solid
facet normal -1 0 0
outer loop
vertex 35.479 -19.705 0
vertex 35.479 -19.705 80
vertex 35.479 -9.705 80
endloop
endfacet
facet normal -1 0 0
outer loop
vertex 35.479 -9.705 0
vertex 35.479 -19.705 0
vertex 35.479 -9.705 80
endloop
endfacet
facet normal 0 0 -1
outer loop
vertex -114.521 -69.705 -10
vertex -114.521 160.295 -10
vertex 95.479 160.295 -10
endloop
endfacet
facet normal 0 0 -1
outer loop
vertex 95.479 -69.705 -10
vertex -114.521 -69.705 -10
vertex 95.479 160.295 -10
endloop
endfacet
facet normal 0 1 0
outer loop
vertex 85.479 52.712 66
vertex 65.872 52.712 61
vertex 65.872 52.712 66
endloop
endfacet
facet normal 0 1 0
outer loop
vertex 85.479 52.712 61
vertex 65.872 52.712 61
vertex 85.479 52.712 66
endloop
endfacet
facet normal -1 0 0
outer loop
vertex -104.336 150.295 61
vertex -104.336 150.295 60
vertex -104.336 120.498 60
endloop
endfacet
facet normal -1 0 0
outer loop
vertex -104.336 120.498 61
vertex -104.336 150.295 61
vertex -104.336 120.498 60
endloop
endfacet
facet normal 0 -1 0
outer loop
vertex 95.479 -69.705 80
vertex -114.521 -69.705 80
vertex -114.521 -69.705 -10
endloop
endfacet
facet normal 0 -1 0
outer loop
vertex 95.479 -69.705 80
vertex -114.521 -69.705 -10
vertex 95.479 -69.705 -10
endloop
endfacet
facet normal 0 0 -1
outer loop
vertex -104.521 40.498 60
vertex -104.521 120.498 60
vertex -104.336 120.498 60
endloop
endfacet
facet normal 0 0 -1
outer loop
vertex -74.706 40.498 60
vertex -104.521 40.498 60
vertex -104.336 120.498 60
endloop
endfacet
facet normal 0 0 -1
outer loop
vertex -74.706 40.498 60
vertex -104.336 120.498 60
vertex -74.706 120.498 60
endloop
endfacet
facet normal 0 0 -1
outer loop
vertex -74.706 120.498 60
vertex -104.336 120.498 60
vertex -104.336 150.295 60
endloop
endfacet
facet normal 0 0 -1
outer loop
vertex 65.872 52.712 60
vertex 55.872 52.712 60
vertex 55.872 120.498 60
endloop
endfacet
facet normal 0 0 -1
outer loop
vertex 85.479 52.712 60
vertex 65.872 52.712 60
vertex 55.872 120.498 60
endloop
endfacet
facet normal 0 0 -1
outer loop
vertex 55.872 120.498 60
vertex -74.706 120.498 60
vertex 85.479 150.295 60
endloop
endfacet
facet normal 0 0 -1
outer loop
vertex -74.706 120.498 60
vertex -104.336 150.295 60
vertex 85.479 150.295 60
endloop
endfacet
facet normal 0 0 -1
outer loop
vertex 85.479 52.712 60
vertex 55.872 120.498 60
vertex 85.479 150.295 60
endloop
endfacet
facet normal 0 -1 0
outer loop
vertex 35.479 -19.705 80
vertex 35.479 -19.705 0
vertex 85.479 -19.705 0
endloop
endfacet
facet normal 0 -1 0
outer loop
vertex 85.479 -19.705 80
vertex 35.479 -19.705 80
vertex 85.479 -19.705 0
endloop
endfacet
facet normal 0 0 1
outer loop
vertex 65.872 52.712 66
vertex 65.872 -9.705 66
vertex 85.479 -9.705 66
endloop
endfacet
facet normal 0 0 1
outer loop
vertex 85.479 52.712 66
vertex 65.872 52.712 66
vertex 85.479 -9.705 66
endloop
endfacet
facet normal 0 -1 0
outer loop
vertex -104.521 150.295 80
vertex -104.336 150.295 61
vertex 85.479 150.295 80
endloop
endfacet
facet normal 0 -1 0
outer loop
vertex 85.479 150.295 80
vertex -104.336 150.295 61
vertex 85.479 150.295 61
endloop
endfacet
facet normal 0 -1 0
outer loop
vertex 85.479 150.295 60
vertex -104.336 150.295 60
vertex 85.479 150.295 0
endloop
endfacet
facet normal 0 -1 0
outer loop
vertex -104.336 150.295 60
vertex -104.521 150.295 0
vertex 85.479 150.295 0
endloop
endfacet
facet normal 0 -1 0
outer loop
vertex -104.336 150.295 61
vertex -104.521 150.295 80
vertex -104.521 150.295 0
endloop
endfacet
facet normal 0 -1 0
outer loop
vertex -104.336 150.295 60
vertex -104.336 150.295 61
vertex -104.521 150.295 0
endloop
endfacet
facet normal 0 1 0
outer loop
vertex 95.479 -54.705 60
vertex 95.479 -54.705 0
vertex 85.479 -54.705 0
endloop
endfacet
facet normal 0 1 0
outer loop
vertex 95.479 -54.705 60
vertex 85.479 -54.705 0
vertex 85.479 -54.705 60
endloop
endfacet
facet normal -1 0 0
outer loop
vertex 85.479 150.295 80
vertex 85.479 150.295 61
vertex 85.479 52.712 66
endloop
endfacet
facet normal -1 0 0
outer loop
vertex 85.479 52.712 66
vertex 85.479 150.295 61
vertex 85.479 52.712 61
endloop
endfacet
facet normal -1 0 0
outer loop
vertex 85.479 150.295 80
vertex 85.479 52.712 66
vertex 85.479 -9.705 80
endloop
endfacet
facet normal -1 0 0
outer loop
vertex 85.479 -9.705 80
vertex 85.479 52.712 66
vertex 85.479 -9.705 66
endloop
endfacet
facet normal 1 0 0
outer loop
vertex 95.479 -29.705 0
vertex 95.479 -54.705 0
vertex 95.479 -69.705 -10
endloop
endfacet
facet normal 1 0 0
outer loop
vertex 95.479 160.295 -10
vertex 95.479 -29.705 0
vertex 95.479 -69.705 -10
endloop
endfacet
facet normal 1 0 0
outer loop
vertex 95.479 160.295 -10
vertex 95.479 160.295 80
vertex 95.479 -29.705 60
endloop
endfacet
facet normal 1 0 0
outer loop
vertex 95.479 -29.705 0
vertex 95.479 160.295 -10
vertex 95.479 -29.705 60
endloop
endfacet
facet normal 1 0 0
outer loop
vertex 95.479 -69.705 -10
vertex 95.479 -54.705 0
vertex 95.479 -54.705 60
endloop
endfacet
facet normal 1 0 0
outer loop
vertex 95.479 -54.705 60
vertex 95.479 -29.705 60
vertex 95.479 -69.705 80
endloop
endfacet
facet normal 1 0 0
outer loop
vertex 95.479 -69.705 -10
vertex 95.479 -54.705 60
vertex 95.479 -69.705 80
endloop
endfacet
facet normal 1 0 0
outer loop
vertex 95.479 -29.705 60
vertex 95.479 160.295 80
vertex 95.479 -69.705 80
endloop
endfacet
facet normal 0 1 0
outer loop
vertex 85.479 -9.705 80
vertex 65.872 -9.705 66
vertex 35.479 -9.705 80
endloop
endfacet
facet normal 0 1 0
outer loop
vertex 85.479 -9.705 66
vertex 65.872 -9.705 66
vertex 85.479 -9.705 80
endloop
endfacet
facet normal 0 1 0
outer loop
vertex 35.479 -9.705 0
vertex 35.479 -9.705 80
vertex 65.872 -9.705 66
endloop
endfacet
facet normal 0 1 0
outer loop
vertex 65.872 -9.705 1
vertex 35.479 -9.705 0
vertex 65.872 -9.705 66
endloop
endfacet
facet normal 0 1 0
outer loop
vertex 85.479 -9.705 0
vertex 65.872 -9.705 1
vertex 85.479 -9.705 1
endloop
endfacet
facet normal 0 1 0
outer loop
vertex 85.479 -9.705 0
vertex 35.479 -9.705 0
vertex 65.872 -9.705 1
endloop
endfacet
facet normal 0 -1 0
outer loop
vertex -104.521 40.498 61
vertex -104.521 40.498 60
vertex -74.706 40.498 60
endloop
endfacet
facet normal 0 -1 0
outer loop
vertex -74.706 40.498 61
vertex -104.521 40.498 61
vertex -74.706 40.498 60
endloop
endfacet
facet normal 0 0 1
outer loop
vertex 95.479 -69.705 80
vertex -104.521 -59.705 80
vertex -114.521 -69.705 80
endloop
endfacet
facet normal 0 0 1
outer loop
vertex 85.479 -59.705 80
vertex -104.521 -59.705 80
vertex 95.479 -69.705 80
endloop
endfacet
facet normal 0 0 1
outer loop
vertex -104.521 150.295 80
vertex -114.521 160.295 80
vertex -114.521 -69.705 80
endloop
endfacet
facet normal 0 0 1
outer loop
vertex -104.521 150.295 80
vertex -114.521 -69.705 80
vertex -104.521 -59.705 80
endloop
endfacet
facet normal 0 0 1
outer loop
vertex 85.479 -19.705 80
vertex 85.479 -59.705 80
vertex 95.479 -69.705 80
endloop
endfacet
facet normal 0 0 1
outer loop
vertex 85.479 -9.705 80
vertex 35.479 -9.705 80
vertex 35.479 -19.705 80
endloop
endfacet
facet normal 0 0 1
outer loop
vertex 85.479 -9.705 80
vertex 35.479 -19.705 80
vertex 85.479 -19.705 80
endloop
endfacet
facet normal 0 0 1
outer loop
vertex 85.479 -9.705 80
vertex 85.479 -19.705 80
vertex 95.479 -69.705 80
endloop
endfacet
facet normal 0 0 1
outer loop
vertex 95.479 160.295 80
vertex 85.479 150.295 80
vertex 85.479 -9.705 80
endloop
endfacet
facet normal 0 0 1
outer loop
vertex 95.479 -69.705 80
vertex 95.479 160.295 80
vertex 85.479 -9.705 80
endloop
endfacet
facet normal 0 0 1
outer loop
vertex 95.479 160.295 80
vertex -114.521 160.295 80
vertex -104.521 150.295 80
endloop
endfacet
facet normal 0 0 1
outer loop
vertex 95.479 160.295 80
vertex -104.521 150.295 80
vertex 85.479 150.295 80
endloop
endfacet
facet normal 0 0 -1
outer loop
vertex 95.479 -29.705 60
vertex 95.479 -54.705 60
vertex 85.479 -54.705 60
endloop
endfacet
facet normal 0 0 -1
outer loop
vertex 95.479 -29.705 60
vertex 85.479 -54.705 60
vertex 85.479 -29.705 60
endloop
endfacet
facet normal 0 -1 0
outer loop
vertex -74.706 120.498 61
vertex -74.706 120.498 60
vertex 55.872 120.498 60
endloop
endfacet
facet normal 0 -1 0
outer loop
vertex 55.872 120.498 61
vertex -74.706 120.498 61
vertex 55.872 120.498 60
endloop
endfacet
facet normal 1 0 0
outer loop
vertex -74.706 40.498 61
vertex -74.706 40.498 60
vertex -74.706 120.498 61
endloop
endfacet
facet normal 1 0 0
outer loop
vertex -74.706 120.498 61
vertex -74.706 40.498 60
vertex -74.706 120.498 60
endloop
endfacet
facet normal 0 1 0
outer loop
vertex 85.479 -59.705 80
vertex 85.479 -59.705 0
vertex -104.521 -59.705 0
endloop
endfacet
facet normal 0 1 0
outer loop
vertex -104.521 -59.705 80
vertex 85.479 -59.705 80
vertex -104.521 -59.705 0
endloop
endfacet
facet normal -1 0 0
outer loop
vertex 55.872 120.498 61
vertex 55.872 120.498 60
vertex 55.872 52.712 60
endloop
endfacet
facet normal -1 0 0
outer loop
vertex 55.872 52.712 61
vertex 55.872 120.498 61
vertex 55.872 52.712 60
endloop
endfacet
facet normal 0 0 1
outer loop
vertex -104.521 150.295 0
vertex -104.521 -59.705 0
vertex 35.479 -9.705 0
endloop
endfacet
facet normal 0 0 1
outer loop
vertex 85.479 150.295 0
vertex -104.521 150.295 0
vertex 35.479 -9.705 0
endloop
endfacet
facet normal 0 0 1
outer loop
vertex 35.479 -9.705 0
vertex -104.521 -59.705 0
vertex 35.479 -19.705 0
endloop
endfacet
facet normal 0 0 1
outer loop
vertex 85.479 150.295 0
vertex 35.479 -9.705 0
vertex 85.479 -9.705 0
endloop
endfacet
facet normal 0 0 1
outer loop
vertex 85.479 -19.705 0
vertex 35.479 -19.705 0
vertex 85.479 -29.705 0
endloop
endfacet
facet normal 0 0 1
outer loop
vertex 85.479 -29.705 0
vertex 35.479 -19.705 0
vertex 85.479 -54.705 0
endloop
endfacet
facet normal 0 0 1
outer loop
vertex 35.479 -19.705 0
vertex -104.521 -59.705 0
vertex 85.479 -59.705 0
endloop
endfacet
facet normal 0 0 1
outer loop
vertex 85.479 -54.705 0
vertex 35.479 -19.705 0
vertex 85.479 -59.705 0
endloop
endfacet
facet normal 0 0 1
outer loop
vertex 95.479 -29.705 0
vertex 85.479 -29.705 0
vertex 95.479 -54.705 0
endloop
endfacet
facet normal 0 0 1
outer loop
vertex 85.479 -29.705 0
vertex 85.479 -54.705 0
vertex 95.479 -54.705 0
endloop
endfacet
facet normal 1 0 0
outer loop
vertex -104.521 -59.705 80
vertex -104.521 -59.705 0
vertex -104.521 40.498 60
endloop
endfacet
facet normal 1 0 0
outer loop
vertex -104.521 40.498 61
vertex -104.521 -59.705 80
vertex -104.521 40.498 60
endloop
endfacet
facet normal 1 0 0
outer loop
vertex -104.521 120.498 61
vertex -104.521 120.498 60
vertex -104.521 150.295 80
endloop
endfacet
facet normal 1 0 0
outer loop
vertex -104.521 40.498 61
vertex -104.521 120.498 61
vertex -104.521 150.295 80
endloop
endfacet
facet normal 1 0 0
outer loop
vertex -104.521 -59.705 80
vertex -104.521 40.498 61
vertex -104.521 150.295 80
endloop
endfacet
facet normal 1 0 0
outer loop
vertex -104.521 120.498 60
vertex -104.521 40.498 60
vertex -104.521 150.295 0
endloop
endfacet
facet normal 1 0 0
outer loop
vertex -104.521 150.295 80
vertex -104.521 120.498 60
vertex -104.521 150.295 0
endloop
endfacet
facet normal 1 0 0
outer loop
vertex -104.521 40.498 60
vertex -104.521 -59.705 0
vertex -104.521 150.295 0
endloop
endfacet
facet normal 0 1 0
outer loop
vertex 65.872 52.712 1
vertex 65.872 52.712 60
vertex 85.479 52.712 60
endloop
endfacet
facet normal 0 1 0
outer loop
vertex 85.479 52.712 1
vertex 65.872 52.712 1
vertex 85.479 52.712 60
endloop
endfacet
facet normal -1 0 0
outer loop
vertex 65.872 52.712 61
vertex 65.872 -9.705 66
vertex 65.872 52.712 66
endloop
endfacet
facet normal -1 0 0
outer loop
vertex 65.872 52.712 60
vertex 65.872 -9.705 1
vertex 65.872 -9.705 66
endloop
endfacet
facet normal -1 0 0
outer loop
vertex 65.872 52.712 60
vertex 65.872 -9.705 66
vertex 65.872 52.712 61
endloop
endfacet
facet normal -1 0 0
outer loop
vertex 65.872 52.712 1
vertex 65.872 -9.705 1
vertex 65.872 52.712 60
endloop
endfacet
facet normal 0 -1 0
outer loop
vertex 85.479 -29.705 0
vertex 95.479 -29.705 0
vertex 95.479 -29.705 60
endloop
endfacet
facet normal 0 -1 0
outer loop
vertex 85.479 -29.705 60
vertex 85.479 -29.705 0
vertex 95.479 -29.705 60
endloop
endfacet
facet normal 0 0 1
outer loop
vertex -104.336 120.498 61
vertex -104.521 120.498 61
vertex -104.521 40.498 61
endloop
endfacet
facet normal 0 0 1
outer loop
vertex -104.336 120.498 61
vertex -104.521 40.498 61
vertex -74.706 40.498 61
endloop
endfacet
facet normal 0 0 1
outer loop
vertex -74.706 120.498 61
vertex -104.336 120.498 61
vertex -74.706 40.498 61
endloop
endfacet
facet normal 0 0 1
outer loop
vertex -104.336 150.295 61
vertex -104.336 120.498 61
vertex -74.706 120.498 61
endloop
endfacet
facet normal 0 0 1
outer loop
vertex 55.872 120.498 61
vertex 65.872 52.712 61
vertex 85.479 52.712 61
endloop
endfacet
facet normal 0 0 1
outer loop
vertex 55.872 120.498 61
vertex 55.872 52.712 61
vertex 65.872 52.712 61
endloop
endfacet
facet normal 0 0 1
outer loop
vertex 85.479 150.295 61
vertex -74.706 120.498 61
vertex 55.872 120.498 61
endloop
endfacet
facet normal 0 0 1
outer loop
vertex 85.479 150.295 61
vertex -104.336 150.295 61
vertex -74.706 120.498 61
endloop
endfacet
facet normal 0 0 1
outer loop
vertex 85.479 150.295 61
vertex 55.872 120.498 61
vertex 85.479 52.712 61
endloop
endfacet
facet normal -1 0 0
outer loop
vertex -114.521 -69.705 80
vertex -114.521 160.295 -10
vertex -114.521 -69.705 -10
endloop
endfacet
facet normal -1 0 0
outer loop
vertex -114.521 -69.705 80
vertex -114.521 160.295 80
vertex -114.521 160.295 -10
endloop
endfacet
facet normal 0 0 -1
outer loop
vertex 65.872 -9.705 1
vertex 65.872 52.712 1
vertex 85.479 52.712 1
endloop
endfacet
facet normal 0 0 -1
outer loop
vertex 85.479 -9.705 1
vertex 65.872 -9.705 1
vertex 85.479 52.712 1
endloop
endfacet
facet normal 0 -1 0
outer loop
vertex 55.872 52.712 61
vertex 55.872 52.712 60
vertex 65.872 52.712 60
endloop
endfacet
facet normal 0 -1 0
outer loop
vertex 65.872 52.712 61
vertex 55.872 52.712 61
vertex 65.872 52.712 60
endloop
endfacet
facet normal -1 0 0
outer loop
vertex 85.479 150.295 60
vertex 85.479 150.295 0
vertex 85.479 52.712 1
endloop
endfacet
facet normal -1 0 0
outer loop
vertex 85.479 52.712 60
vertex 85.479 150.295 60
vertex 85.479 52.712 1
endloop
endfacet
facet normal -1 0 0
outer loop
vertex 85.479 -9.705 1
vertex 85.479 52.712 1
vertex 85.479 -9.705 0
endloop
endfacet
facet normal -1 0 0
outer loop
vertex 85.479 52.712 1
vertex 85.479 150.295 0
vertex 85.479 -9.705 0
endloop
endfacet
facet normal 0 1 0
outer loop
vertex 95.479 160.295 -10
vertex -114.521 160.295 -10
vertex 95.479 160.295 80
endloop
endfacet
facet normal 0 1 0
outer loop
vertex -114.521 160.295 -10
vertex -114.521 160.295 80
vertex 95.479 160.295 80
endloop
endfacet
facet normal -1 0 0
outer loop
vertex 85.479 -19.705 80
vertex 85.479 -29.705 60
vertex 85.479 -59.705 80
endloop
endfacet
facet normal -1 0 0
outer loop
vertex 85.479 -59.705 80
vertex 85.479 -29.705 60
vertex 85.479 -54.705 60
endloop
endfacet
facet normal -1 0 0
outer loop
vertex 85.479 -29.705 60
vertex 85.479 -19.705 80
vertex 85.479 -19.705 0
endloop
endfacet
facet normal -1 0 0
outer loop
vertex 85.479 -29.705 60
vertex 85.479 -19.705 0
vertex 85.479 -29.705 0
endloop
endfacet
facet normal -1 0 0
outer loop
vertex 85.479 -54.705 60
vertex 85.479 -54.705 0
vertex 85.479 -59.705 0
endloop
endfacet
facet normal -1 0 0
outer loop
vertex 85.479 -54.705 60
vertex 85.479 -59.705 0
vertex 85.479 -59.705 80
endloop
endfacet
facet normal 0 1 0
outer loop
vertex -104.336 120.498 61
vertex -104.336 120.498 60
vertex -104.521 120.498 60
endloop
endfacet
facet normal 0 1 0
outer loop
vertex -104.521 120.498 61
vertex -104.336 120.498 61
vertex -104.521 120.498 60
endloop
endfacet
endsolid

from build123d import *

# Parameters (mm, degrees)
F0_W      = 210
F0_H      = 230
F0_W_2    = 50
F0_H_2    = 10
F1_DEPTH  = 80
F2_W      = 210
F2_H      = 230
F3_DEPTH  = 10
F5_W      = 20
F5_H      = 63
F6_DEPTH  = 1
F7_W      = 19.6074382961
F7_H      = 62.4177437024
F8_DEPTH  = 60
F9_W      = 25
F9_H      = 60
F10_DEPTH = 10
F11_W     = 19.6074382961
F11_H     = 52.7124775872
F12_DEPTH = 5
F13_DEPTH = 5


with BuildPart() as f1:
    # F0 (on Top) → F1 (new body)
    with BuildSketch(Plane.XY):
        with Locations((-9.5208105445, 45.2947338848)):
            Rectangle(F0_W, F0_H)
        Polygon((-104.5208105445, -59.7052661152), (-104.5208105445, 150.2947338848), (85.4791894555, 150.2947338848), (85.4791894555, -9.7052661152), (85.4791894555, -19.7052661152), (85.4791894555, -59.7052661152), (35.4791894555, -59.7052661152), align=None, mode=Mode.SUBTRACT)
        with Locations((60.4791894555, -14.7052661152)):
            Rectangle(F0_W_2, F0_H_2)
    extrude(amount=F1_DEPTH)

    # F2 (on face) → F3 (join)
    with BuildSketch(Plane(origin=(0, 0, 0), x_dir=(1, 0, 0), z_dir=(0, 0, -1))):
        with Locations((-9.5208105445, -45.2947338848)):
            Rectangle(F2_W, F2_H)
        Polygon((-104.5208105445, -150.2947338848), (-104.5208105445, 59.7052661152), (85.4791894555, 59.7052661152), (85.4791894555, 19.7052661152), (35.4791894555, 19.7052661152), (35.4791894555, 9.7052661152), (85.4791894555, 9.7052661152), (85.4791894555, -150.2947338848), align=None, mode=Mode.SUBTRACT)
        Polygon((85.4791894555, 59.7052661152), (-104.5208105445, 59.7052661152), (-104.5208105445, -150.2947338848), (85.4791894555, -150.2947338848), (85.4791894555, 9.7052661152), (35.4791894555, 9.7052661152), (35.4791894555, 19.7052661152), (85.4791894555, 19.7052661152), align=None)
    extrude(amount=F3_DEPTH)

    # F5 (on offset) → F6 (join)
    with BuildSketch(Plane.XY.offset(60)):
        Polygon((85.6644883752, 150.4975861311), (-104.3355116248, 150.4975861311), (-104.3355116248, 120.4975861311), (-74.7061234713, 120.4975861311), (55.8717511594, 120.4975861311), (85.6644883752, 120.4975861311), align=None)
        Polygon((-74.7061234713, 120.4975861311), (-104.3355116248, 120.4975861311), (-104.7061234713, 120.4975861311), (-104.7061234713, 40.4975861311), (-74.7061234713, 40.4975861311), align=None)
        Polygon((85.8717511594, 120.4975861311), (85.6644883752, 120.4975861311), (55.8717511594, 120.4975861311), (55.8717511594, 52.7124775872), (65.8717511594, 52.7124775872), (85.8717511594, 52.7124775872), align=None)
        with Locations((75.8717511594, 21.2124775872)):
            Rectangle(F5_W, F5_H)
    extrude(amount=F6_DEPTH)

    # F7 (on face) → F8 (join)
    with BuildSketch(Plane.XY.offset(61)):
        with Locations((75.6754703075, 21.503605736)):
            Rectangle(F7_W, F7_H)
    extrude(amount=-F8_DEPTH)

    # F9 (on face) → F10 (cut, through all)
    with BuildSketch(Plane.YZ.offset(95.4791894555)):
        with Locations((-42.2052661152, 30)):
            Rectangle(F9_W, F9_H)
    extrude(amount=-F10_DEPTH, mode=Mode.SUBTRACT)

    # F11 (on face) → F12 (join)
    with BuildSketch(Plane.XY.offset(61)):
        with Locations((75.6754703075, 26.3562387936)):
            Rectangle(F11_W, F11_H)
    extrude(amount=F12_DEPTH)

    # F13 (add): a face of the model
    f13_faces = [f1.faces().sort_by_distance(p)[0] for p in [
        (75.6754703075, -4.8526330576, 61),
    ]]
    extrude(f13_faces, amount=F13_DEPTH)


solid = f1.part
